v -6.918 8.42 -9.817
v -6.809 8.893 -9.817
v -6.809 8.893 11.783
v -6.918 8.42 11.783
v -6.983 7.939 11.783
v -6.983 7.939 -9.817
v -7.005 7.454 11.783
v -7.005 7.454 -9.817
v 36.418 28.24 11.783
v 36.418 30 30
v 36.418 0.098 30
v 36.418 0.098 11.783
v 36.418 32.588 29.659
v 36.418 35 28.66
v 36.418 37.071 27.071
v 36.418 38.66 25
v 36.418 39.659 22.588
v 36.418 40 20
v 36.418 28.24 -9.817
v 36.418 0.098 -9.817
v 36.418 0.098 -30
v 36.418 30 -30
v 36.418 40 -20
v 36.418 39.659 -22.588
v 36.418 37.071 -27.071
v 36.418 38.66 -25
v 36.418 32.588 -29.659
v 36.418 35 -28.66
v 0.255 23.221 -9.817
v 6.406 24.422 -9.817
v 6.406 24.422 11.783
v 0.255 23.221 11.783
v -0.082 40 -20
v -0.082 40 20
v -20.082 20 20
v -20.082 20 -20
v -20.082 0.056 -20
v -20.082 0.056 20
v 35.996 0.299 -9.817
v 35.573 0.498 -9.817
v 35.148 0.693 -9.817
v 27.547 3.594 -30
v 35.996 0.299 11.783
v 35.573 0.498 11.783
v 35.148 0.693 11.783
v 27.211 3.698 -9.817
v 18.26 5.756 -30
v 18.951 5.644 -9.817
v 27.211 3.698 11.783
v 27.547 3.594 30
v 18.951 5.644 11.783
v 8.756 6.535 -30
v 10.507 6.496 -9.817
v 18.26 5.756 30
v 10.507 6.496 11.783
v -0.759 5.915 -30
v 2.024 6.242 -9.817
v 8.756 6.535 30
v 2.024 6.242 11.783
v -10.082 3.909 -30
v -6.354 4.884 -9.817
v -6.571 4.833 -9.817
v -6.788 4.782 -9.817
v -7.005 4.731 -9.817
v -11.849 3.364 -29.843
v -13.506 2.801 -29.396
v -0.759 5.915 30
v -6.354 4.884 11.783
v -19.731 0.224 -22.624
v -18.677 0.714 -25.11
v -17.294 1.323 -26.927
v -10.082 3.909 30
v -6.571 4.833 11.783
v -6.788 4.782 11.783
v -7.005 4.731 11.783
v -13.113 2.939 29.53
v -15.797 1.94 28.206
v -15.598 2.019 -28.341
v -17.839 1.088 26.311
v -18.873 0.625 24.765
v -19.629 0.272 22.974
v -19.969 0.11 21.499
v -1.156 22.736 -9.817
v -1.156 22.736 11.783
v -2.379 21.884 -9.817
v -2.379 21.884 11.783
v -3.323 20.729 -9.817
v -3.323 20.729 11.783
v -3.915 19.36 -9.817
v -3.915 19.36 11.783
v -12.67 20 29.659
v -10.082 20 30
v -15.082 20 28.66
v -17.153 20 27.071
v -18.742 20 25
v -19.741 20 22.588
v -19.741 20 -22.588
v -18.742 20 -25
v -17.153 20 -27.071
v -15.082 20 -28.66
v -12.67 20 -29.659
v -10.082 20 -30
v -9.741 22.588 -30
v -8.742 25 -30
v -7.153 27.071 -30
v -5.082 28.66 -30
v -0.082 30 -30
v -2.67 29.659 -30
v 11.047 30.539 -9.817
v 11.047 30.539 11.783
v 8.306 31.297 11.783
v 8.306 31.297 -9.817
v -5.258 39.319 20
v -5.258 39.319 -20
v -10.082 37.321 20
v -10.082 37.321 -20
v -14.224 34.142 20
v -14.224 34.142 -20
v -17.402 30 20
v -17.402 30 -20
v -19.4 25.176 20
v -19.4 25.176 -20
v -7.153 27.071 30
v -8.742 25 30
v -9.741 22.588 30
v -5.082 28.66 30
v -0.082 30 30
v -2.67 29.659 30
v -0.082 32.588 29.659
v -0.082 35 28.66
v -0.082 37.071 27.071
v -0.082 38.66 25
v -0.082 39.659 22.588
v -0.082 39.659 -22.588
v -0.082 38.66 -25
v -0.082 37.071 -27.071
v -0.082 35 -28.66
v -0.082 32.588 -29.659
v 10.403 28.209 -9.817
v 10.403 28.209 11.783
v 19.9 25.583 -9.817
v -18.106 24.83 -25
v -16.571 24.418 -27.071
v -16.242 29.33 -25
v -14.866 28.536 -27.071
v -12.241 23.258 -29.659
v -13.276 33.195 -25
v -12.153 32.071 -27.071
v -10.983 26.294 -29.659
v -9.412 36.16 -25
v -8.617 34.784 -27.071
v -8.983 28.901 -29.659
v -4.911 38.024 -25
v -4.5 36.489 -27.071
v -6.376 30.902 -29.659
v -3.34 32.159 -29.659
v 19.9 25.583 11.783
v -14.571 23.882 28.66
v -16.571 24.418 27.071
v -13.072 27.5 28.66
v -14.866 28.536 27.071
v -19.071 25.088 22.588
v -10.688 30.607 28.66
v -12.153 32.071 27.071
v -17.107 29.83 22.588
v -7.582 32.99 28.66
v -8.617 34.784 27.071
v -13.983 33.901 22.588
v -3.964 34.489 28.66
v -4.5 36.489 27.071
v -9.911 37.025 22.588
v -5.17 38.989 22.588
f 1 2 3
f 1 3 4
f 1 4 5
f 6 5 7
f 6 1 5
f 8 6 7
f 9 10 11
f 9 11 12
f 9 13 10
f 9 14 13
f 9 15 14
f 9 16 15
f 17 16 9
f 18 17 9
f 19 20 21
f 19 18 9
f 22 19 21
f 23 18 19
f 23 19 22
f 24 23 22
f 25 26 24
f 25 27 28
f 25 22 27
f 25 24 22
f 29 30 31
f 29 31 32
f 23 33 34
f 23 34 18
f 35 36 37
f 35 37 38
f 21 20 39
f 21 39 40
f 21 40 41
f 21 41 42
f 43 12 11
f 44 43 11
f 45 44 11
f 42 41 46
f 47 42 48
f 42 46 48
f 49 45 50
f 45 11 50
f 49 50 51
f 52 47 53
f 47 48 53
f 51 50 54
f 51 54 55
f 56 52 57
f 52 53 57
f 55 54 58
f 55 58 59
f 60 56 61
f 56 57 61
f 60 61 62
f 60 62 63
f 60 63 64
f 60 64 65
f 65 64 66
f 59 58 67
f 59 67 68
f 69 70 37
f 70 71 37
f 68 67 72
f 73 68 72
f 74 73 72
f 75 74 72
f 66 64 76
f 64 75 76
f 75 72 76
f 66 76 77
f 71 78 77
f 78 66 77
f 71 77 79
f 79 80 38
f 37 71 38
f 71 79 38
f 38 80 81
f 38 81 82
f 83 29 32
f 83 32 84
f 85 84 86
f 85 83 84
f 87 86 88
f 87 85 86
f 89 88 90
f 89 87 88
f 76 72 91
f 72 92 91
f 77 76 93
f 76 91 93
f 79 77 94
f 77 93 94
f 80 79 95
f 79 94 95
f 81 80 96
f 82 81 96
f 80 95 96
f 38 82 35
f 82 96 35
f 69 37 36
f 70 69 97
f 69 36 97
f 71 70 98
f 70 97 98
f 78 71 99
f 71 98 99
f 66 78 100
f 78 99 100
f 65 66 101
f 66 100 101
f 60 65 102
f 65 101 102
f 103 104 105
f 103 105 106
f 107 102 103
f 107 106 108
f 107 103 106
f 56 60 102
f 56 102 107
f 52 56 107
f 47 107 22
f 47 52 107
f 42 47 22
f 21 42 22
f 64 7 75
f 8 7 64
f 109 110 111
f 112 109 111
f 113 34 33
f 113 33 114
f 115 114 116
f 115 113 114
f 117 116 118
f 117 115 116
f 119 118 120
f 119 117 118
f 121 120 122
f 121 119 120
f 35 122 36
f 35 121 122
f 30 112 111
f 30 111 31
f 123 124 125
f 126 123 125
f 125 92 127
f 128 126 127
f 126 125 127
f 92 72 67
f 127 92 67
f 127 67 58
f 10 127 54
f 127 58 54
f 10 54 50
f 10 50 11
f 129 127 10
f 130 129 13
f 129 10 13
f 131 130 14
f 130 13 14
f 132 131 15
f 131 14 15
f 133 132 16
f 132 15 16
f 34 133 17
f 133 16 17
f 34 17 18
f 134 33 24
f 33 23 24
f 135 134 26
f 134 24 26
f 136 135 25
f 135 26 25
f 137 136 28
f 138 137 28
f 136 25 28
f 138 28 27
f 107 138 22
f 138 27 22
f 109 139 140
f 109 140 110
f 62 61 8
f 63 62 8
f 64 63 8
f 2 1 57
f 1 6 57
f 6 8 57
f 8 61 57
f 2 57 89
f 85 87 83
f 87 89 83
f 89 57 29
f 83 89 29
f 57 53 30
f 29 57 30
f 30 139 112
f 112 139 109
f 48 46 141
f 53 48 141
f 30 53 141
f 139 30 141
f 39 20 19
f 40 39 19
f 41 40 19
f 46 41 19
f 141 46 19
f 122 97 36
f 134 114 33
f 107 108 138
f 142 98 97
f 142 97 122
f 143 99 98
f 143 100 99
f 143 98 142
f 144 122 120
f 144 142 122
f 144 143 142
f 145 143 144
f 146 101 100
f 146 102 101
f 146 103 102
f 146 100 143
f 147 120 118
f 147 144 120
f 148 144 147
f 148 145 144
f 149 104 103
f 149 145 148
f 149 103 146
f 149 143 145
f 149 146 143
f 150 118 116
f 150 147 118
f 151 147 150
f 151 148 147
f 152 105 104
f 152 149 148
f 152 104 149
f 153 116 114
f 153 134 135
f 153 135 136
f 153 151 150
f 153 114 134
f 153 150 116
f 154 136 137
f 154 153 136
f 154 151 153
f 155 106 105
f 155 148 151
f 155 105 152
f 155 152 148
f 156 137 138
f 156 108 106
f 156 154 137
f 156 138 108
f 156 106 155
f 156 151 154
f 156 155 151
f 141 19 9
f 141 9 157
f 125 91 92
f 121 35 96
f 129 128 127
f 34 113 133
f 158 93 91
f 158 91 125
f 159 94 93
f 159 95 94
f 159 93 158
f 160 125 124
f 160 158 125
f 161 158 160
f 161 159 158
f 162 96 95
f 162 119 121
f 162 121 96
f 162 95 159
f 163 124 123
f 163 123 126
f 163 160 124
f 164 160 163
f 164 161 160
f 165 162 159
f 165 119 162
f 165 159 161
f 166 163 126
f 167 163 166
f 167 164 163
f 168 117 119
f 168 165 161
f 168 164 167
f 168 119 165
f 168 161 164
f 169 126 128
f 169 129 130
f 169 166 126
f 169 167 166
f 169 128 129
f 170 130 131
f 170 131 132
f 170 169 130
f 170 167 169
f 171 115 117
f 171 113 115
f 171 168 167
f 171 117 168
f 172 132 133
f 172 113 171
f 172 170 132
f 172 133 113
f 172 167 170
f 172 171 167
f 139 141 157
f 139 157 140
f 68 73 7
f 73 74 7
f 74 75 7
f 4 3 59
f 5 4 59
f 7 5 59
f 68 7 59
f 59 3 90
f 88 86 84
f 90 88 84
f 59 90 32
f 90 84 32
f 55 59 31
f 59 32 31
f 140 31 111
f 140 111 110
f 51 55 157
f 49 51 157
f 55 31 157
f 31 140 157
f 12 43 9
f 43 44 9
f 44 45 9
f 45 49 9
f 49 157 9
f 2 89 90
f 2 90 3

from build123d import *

# Parameters (mm, degrees)
SKETCH1_W                      = 60
SKETCH1_H                      = 60
BOSS_EXTRUDE1_DEPTH            = 40
SKETCH2_R                      = 65
CUT_EXTRUDE1_DEPTH             = 82.241203775
CAVITY1_START                  = -9.816541319
CAVITY1_DEPTH                  = 21.6
SKETCH3_W                      = 21.6
SKETCH3_H                      = 10.847854466
CUT_EXTRUDE2_DEPTH             = 10
SKETCH4_W                      = 60
SKETCH4_H                      = 40
CUT_EXTRUDE3_DEPTH             = 2.5
SKETCH5_W                      = 60
SKETCH5_H                      = 40
CUT_EXTRUDE4_DEPTH             = 1
FILLET1_R                      = 20
FILLET2_R                      = 10
SKETCH6_W                      = 16.032155739
SKETCH6_H                      = 21.6
CUT_EXTRUDE5_DEPTH             = 58.845323025
CUT_EXTRUDE5_DIRECTION_2_REACH = 59.845


# Read off the part's stored shape, not the designer's step: Cavity1
with BuildPart() as part:
    # Sketch1 → Boss-Extrude1 (new body)
    with BuildSketch(Plane(origin=(0, 0, 0), x_dir=(1, 0, 0), z_dir=(0, 1, 0))):
        with Locations((7.418353663, 0)):
            Rectangle(SKETCH1_W, SKETCH1_H)
    extrude(amount=BOSS_EXTRUDE1_DEPTH)

    # Sketch2 → Cut-Extrude1 (cut, through all)
    with BuildSketch(Plane.XY.offset(30)):
        with Locations((8.211917099, -58.463187122)):
            Circle(SKETCH2_R)
    extrude(amount=-CUT_EXTRUDE1_DEPTH, mode=Mode.SUBTRACT)

    # Cavity1 outline → Cavity1 (cut)
    with BuildSketch(Plane.XY.offset(CAVITY1_START)):
        with BuildLine():
            Line((37.418353663, 28.401179965), (19.900272044, 25.583077508))
            Line((19.900272044, 25.583077508), (10.402665556, 28.20897422))
            Line((10.402665556, 28.20897422), (11.046955399, 30.539306317))
            Line((11.046955399, 30.539306317), (8.306376045, 31.297021255))
            Line((8.306376045, 31.297021255), (6.40567059, 24.42235921))
            Line((6.40567059, 24.42235921), (0.254542205, 23.221419402))
            ThreePointArc((0.254542205, 23.221419402), (-2.379423034, 21.883873023), (-3.91543957, 19.360491087))
            Line((-3.91543957, 19.360491087), (-6.809482783, 8.89302545))
            ThreePointArc((-6.809482783, 8.89302545), (-6.970209101, 6.844246899), (-6.353840253, 4.883783703))
            ThreePointArc((-6.353840253, 4.883783703), (14.742582186, 6.207906989), (35.148358053, 0.692777486))
            Line((35.148358053, 0.692777486), (37.418353663, 2.423285883))
            Line((37.418353663, 2.423285883), (37.418353663, 28.401179965))
        make_face()
    extrude(amount=CAVITY1_DEPTH, mode=Mode.SUBTRACT)

    # Sketch3 → Cut-Extrude2 (cut)
    with BuildSketch(Plane(origin=(37.418353663, 0, 0), x_dir=(0, 0, -1), z_dir=(1, 0, 0))):
        with Locations((-0.983458681, 5.423927233)):
            Rectangle(SKETCH3_W, SKETCH3_H)
    extrude(amount=-CUT_EXTRUDE2_DEPTH, mode=Mode.SUBTRACT)

    # Sketch4 → Cut-Extrude3 (cut)
    with BuildSketch(Plane.ZY.offset(22.581646337)):
        with Locations((0, 20)):
            Rectangle(SKETCH4_W, SKETCH4_H)
    extrude(amount=-CUT_EXTRUDE3_DEPTH, mode=Mode.SUBTRACT)

    # Sketch5 → Cut-Extrude4 (cut)
    with BuildSketch(Plane(origin=(37.418353663, 0, 0), x_dir=(0, 0, -1), z_dir=(1, 0, 0))):
        with Locations((0, 20)):
            Rectangle(SKETCH5_W, SKETCH5_H)
    extrude(amount=-CUT_EXTRUDE4_DEPTH, mode=Mode.SUBTRACT)

    # Fillet1
    fillet1_edges = [part.edges().sort_by_distance(p)[0] for p in [
        (-20.081646337, 40, 0),
    ]]
    fillet(fillet1_edges, radius=FILLET1_R)

    # Fillet2
    fillet2_edges = [part.edges().sort_by_distance(p)[0] for p in [
        (-20.081646337, 10.027910314, 30),
        (18.168353663, 40, -30),
        (-20.081646337, 10.027910314, -30),
        (-14.22378196, 34.142135624, -30),
        (18.168353663, 40, 30),
        (-14.22378196, 34.142135624, 30),
    ]]
    fillet(fillet2_edges, radius=FILLET2_R)

    # Sketch6 → Cut-Extrude5 (cut)
    with BuildSketch(Plane(origin=(0, 6.536812878, 0), x_dir=(-1, 0, 0), z_dir=(0, -1, 0))):
        with Locations((-1.011330106, -0.983458681)):
            Rectangle(SKETCH6_W, SKETCH6_H)
    extrude(amount=CUT_EXTRUDE5_DEPTH, mode=Mode.SUBTRACT)

    # Sketch6 → Cut-Extrude5 direction 2 (cut, up to next)
    with BuildSketch(Plane(origin=(0, 6.536812878, 0), x_dir=(-1, 0, 0), z_dir=(0, -1, 0)), mode=Mode.PRIVATE) as cut_extrude5_direction_2_sk1:
        with Locations((-1.011330106, -0.983458681)):
            Rectangle(SKETCH6_W, SKETCH6_H)
    cut_extrude5_direction_2_tool1 = extrude(cut_extrude5_direction_2_sk1.sketch, amount=-CUT_EXTRUDE5_DIRECTION_2_REACH, mode=Mode.PRIVATE) & part.part
    add(cut_extrude5_direction_2_tool1.solids().sort_by_distance((1.01133, 6.536813, 0.983459))[0], mode=Mode.SUBTRACT)


solid = part.part
